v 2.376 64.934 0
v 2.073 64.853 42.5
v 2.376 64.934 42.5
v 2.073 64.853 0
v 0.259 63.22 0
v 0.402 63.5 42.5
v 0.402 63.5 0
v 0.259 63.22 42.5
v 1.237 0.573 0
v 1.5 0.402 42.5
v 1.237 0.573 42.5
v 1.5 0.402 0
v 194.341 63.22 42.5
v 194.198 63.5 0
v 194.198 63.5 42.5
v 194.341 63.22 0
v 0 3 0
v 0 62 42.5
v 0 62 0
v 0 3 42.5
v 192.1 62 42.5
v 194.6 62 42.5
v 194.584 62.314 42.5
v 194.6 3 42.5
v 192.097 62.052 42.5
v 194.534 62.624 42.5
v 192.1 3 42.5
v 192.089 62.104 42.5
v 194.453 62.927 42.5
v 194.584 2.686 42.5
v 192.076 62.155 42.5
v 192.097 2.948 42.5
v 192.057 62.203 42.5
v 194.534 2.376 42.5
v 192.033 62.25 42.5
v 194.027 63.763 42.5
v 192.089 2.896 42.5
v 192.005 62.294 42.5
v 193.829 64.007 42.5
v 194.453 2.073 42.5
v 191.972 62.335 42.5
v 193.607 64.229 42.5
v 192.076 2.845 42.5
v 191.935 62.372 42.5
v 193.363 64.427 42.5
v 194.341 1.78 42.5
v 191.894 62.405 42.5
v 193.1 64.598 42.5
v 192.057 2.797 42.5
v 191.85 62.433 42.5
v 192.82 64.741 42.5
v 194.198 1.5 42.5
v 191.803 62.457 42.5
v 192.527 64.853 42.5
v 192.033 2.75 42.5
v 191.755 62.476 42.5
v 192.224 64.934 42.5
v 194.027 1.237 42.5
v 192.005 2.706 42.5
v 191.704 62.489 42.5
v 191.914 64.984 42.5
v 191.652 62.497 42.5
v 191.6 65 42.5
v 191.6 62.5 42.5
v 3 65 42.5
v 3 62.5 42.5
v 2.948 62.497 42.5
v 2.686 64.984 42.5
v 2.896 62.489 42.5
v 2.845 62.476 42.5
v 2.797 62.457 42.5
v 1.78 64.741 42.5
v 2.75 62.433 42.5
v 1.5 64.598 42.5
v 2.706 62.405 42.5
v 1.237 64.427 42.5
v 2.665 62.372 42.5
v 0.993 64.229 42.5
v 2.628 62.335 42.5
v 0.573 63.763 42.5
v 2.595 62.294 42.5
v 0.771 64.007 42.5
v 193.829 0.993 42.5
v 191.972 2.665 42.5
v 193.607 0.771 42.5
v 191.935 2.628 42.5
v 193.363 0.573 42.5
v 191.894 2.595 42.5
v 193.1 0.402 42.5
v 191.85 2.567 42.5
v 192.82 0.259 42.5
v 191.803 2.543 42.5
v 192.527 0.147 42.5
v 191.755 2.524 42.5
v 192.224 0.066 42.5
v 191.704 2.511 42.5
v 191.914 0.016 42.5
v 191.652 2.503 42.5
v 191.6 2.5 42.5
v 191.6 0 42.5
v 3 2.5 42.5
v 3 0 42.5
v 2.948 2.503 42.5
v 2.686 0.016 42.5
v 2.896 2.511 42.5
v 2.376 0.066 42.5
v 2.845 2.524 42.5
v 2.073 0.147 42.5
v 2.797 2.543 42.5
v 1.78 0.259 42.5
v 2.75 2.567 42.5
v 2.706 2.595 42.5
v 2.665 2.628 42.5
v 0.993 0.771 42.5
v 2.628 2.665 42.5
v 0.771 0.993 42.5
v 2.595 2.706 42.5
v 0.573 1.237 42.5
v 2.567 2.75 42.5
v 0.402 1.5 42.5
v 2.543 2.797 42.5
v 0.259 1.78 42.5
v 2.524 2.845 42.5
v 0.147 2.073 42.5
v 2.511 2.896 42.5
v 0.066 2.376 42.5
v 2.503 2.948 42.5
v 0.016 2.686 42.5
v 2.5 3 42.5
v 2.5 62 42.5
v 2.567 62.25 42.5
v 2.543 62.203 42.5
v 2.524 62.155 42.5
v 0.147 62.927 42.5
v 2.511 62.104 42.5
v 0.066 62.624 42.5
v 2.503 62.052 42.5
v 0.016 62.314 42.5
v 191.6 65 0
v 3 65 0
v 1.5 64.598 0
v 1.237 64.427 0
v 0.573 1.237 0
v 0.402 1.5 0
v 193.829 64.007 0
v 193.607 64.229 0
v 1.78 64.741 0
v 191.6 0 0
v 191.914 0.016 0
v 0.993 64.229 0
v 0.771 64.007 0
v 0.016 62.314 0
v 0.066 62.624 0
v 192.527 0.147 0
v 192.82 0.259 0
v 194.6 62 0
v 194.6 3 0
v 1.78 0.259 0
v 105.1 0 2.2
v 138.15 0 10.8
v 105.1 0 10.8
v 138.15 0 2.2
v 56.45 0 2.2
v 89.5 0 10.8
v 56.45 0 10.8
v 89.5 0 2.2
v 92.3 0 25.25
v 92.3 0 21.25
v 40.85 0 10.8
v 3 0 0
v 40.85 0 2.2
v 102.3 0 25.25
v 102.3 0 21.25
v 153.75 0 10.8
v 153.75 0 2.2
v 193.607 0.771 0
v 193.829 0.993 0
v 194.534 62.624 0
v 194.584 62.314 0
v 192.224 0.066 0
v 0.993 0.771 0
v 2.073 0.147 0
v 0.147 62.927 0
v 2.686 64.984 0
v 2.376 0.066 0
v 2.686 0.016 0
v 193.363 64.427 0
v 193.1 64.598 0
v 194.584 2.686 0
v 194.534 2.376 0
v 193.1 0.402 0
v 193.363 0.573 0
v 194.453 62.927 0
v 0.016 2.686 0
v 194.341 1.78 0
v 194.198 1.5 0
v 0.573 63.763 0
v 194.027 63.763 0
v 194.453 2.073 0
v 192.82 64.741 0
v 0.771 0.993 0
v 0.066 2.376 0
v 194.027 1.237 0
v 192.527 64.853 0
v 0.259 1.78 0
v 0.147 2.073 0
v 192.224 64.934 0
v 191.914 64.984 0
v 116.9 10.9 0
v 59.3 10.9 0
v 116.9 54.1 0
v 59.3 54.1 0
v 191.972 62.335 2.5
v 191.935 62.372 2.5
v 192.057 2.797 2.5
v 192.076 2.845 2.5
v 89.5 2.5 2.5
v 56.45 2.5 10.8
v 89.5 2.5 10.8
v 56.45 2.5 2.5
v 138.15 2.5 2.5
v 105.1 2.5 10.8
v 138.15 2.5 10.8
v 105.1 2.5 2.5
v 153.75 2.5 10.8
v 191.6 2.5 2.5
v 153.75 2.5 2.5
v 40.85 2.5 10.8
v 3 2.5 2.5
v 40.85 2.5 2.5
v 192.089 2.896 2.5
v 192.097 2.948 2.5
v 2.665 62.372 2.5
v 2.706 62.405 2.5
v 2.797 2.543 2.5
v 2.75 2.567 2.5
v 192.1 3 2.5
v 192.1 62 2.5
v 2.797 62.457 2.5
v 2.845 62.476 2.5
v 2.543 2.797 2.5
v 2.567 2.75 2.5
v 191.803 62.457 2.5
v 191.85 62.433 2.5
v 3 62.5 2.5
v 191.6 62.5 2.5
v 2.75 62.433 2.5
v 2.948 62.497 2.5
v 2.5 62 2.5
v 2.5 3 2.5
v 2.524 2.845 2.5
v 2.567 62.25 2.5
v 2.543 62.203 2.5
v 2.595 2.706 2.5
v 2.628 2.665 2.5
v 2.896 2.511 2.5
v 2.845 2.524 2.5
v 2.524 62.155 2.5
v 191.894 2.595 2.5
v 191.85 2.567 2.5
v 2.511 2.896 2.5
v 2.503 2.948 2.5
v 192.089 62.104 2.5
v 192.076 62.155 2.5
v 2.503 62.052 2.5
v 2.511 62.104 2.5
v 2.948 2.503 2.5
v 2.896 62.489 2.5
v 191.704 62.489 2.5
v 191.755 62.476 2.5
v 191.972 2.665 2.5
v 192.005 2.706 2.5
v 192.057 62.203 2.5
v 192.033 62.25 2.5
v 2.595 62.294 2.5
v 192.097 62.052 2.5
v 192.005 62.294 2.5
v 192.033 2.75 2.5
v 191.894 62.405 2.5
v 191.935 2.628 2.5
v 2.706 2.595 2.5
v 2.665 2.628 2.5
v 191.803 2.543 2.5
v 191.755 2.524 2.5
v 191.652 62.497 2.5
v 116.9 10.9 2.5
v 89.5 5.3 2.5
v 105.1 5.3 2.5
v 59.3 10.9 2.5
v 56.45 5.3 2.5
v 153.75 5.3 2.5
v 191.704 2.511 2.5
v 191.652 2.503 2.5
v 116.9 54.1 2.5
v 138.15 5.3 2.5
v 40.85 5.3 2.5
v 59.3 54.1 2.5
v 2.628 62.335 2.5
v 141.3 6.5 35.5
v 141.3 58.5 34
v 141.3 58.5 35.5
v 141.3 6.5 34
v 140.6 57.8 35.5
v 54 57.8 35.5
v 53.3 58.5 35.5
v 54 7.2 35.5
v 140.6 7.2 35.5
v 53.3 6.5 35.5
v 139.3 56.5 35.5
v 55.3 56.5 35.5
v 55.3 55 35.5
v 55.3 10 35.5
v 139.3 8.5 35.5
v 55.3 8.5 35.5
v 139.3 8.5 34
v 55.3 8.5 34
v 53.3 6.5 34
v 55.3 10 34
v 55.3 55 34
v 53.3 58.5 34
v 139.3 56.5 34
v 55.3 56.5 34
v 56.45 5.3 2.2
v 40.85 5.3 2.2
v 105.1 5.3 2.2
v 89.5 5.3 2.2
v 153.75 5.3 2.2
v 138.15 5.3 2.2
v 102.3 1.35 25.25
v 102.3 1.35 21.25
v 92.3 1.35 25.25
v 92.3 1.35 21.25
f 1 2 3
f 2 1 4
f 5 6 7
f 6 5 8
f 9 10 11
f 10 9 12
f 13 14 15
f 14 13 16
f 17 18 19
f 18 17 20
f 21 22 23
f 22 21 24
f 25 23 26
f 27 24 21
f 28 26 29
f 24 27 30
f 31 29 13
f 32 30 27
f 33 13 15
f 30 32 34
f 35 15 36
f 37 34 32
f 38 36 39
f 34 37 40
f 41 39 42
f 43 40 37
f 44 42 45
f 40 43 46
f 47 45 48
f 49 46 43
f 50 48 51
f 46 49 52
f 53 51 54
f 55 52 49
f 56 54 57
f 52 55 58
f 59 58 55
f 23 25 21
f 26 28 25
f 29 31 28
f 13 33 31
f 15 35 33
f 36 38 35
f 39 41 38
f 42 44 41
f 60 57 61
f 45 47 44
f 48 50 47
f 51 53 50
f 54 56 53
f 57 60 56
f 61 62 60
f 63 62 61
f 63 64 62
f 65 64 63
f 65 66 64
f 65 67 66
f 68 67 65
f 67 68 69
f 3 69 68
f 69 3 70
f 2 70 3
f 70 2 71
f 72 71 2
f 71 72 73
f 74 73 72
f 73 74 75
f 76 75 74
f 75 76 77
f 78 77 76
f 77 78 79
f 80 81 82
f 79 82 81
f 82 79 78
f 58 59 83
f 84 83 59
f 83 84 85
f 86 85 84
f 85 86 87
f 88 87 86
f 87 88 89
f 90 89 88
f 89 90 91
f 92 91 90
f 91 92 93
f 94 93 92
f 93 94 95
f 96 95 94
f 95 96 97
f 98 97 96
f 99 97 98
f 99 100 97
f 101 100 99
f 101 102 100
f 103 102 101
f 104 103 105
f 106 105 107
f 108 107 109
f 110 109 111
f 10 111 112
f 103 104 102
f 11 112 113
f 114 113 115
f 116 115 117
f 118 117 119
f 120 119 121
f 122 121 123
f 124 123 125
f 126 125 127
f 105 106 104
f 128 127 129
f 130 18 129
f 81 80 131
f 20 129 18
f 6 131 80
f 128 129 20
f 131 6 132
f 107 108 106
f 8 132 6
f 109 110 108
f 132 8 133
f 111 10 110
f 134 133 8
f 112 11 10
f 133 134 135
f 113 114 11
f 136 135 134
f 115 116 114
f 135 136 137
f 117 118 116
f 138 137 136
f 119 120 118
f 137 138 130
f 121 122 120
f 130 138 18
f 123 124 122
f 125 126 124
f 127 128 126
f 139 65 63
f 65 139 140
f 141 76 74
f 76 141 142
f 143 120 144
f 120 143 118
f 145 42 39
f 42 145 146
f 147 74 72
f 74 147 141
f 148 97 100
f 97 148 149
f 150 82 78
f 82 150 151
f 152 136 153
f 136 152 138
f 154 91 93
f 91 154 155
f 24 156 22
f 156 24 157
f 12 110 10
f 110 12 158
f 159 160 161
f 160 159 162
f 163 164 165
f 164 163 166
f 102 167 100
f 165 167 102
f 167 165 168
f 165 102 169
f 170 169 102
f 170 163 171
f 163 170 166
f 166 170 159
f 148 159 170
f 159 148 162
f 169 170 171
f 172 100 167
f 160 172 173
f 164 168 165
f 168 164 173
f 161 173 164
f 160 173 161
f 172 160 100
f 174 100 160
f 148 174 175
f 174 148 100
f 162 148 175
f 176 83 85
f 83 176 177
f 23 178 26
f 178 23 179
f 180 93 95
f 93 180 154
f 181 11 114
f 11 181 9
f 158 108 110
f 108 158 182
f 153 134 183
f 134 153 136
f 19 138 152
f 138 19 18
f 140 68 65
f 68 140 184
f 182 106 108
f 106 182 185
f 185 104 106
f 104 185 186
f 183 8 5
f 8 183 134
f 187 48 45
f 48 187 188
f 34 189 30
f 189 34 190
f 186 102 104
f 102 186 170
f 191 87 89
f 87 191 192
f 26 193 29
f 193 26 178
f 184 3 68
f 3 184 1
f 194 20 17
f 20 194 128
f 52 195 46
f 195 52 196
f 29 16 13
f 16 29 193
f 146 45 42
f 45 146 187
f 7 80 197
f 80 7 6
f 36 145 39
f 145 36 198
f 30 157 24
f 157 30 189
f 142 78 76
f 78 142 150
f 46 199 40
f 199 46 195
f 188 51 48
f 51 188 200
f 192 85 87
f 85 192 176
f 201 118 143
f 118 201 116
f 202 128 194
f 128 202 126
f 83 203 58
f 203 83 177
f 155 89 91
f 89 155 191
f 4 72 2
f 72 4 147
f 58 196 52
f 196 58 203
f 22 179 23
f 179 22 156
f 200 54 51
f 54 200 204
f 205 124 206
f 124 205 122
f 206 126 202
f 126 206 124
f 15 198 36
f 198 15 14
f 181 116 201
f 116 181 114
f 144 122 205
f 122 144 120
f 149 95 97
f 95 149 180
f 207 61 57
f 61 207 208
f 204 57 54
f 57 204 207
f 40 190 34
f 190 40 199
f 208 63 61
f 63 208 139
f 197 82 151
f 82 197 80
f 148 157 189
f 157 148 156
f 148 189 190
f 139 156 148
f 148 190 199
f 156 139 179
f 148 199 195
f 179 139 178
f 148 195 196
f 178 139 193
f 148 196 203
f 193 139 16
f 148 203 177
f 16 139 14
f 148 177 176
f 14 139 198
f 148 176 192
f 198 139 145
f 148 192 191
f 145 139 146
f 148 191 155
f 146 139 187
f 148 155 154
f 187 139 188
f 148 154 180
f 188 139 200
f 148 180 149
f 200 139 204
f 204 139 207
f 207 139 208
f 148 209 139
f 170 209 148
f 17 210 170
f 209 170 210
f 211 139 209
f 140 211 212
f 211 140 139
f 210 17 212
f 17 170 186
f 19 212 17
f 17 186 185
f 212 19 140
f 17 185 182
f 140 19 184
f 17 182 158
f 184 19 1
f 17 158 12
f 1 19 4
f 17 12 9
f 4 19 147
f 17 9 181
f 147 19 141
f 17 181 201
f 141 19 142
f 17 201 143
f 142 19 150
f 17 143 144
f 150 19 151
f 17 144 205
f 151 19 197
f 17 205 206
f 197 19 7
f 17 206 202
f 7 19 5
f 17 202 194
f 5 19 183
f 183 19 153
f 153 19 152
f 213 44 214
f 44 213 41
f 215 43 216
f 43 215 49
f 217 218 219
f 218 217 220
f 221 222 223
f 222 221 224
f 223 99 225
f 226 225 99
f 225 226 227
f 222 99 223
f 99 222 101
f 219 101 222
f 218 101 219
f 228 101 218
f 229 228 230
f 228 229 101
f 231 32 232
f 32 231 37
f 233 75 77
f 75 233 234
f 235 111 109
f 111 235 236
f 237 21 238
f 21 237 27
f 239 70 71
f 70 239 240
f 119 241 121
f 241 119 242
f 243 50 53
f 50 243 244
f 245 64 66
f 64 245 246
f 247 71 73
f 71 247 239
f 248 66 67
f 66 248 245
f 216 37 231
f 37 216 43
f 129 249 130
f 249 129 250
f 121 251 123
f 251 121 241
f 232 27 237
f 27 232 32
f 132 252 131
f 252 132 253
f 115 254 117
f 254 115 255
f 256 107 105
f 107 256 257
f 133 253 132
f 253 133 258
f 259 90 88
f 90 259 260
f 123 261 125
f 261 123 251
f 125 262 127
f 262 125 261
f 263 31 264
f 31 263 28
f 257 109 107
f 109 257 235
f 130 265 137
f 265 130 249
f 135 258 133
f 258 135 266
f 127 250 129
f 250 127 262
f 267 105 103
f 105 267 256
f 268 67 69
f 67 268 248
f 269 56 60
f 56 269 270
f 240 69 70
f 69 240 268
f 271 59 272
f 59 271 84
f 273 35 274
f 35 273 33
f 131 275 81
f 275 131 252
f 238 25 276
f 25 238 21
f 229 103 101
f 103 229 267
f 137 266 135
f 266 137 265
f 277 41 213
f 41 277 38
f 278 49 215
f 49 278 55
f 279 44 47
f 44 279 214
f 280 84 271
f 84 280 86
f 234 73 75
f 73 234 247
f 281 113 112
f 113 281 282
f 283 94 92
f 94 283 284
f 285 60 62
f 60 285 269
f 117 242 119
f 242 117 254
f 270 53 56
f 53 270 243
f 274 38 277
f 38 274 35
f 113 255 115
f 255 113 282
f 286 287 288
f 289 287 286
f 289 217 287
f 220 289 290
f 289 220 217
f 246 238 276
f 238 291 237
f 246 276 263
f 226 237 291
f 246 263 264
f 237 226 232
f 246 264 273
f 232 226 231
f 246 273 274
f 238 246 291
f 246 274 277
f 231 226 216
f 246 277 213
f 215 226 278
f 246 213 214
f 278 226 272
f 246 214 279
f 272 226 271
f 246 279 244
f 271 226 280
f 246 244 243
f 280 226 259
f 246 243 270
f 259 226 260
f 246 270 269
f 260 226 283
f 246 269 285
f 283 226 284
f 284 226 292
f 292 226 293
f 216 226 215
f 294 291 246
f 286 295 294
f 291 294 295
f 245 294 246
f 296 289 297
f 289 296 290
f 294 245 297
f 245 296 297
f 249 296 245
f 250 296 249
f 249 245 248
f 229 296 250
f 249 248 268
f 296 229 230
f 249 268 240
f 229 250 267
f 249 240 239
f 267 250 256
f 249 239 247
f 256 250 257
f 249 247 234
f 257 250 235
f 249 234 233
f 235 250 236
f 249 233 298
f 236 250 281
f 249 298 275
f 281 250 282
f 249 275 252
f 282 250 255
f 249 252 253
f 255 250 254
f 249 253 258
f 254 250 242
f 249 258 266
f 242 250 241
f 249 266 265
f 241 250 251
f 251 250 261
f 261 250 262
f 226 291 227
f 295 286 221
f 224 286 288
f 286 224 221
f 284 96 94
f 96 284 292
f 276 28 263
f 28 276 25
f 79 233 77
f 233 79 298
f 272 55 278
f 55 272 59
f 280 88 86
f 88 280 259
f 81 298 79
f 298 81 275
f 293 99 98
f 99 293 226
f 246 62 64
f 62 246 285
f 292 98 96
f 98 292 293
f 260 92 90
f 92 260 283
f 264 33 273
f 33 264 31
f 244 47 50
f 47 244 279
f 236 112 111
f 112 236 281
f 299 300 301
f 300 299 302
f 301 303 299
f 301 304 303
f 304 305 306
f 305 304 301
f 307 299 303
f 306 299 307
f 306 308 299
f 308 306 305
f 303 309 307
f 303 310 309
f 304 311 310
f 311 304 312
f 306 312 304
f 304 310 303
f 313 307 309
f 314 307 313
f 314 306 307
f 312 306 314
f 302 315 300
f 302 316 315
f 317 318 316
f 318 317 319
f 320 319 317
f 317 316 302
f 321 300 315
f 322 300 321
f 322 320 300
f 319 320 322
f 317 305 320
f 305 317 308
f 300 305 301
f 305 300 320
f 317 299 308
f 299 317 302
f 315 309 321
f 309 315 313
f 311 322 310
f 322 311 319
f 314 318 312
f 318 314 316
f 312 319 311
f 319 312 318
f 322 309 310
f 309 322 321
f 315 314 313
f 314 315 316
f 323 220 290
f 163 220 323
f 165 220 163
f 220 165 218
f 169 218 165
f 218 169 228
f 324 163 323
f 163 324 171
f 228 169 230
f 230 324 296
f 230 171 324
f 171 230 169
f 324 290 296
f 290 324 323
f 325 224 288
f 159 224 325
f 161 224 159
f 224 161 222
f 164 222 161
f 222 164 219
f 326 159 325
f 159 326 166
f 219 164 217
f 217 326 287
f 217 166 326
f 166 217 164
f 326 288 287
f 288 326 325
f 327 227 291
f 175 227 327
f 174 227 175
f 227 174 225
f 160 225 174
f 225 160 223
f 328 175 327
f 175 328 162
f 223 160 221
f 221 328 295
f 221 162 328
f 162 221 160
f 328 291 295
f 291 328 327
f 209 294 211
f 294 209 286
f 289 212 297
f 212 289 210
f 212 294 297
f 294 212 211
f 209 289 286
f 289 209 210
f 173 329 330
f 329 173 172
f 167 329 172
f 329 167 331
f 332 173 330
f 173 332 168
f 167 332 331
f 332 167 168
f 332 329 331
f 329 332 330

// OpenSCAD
// file: ../parameters.scad
/*
 * Copyright (C) 2026 Peter Buchegger
 *
 * This file is part of OpenDriveHub.
 *
 * OpenDriveHub is free software: you can redistribute it and/or modify
 * it under the terms of the GNU General Public License as published by
 * the Free Software Foundation, either version 3 of the License, or
 * (at your option) any later version.
 *
 * OpenDriveHub is distributed in the hope that it will be useful,
 * but WITHOUT ANY WARRANTY; without even the implied warranty of
 * MERCHANTABILITY or FITNESS FOR A PARTICULAR PURPOSE. See the
 * GNU General Public License for more details.
 *
 * You should have received a copy of the GNU General Public License
 * along with OpenDriveHub. If not, see <https://www.gnu.org/licenses/>.
 *
 * SPDX-License-Identifier: GPL-3.0-or-later
 */

// =============================================================================
// OpenDriveHub Transmitter Enclosure – Central Parameters
// =============================================================================
// All dimensions in millimeters. Change values here to adjust the entire design.
//
// LAYOUT: Three zones arranged horizontally (front to back, Y axis):
//   [Joystick Zone] → [Module Zone] → [Display Zone]
// All zones share the same width (X). Each zone fits on the print bed.

// --- Print Bed Constraints ---------------------------------------------------
print_bed_x = 200;
print_bed_y = 200;

// --- General Construction ----------------------------------------------------
wall_thickness    = 2.5;   // Outer wall thickness
inner_wall        = 1.6;   // Internal divider walls
corner_radius     = 3.0;   // Outer corner rounding
fit_tolerance     = 0.3;   // General 3D-print fit tolerance

// --- Screw & Fastener Dimensions ---------------------------------------------
// M3 Heat-Set Insert (standard M3×5×5 brass insert)
m3_screw_dia      = 3.2;   // M3 clearance hole
m3_screw_head_dia = 5.8;   // M3 socket head cap screw head
m3_screw_head_h   = 3.0;   // M3 head height
m3_insert_dia     = 4.6;   // Heat-set insert outer diameter
m3_insert_depth   = 5.0;   // Heat-set insert depth
m3_insert_hole_dia = 4.8;  // Hole diameter for heat-set insert (slightly larger)

// --- Zone Connection (tongue-and-groove between zones) -----------------------
tongue_width      = 15.0;  // Width of each tongue
tongue_height     = 8.0;   // Height of tongue (Z)
tongue_depth      = 5.0;   // How far the tongue protrudes (Y)
tongue_tolerance  = 0.3;   // Gap for fit
tongue_count      = 3;     // Number of tongues per joint edge

// --- Joystick D400-R4 --------------------------------------------------------
// JH-D400X-R4 3-axis joystick (panel-mount)
joy_body_width    = 49.6;  // Joystick body width (X)
joy_body_length   = 94.5;  // Joystick body length (Y)
joy_body_height   = 35.0;  // Body height below panel
joy_shaft_height  = 40.0;  // Shaft height above panel
joy_panel_cutout  = 28.0;  // Circular panel cutout diameter
joy_mounting_dia  = 36.0;  // Mounting ring outer diameter
joy_mounting_hole_dia = 3.2; // Mounting screw holes
joy_mounting_hole_pcd = 40.0; // Mounting hole pitch circle diameter

// Ergonomic spacing
joy_center_distance   = 125; // Center-to-center distance between joysticks

// --- Module Bay --------------------------------------------------------------
bay_unit_size     = 30.0;  // Single bay unit (30×30mm)
bay_depth         = 25.0;  // Bay depth (how deep the module sits)
bay_wall          = 1.2;   // Wall between adjacent bays
bay_screw_inset   = 4.0;   // Screw hole distance from bay edge (rear mounting)

// Grid configuration
bay_grid_cols     = 5;     // Number of columns (along X)
bay_grid_rows     = 3;     // Number of rows (along Y)

// Computed grid dimensions
bay_grid_width  = bay_grid_cols * bay_unit_size + (bay_grid_cols + 1) * bay_wall;
bay_grid_height = bay_grid_rows * bay_unit_size + (bay_grid_rows + 1) * bay_wall;

// --- Display (ILI9341 2.8" TFT LCD, mounted LANDSCAPE) ----------------------
// In landscape orientation: long edge = X (width), short edge = Y (depth)
display_pcb_width    = 86.0;   // PCB along X (landscape)
display_pcb_depth    = 50.0;   // PCB along Y (landscape)
display_pcb_thick    = 1.6;    // PCB thickness
display_module_thick = 5.0;    // Total module thickness (PCB + components)

display_view_width   = 57.6;   // Visible area along X (landscape)
display_view_depth   = 43.2;   // Visible area along Y (landscape)
display_view_offset_x = 5.0;   // View area offset from PCB left edge
display_view_offset_y = 3.4;   // View area offset from PCB front edge

display_mount_hole_dia = 3.0;  // Mounting hole diameter
display_mount_inset    = 2.5;  // Mounting hole distance from PCB edge

// --- ESP32 DevKitC (38-pin) --------------------------------------------------
esp32_pcb_width   = 28.0;
esp32_pcb_length  = 55.0;
esp32_pcb_thick   = 1.6;
esp32_total_height = 10.0;    // Including components underneath
esp32_usb_width   = 8.0;      // Micro-USB port width
esp32_usb_height  = 3.5;      // Micro-USB port height

// --- TCA9548A I²C Mux Breakout -----------------------------------------------
mux_pcb_width     = 18.0;
mux_pcb_length    = 25.0;
mux_pcb_thick     = 1.6;

// --- Battery (2S LiPo) ------------------------------------------------------
battery_width     = 35.0;     // Typical 2S 1000-1500mAh LiPo
battery_length    = 68.0;
battery_height    = 18.0;
battery_clearance = 2.0;      // Extra space around battery

// --- Ergonomic Grip ----------------------------------------------------------
grip_length       = 80.0;     // Grip length (Z, downward from joystick zone)
grip_width        = 35.0;     // Grip cross-section width
grip_depth        = 30.0;     // Grip cross-section depth
grip_fillet       = 8.0;      // Grip edge rounding

// --- Zone Dimensions ---------------------------------------------------------
// Uniform width for all zones (X axis) – driven by the widest content
zone_width = max(
    joy_center_distance + joy_body_width + 20, // Joystick spacing + margin
    bay_grid_width + 20,                        // Module grid + margin
    display_pcb_width + 20                      // Display PCB + margin
);

// Zone heights (Z axis) – the enclosure shell height
zone_height       = joy_body_height + wall_thickness + 5; // ~42.5mm

// Zone depths (Y axis, front-to-back for each zone)
joy_zone_depth    = joy_body_width + 20;      // ~70mm
module_zone_depth = bay_grid_height + 15;     // ~110mm
display_zone_depth = display_pcb_depth + 15;  // ~65mm

// Total transmitter depth
total_depth = joy_zone_depth + module_zone_depth + display_zone_depth;

// --- Mounting Posts -----------------------------------------------------------
mount_post_dia     = 8.0;     // Outer diameter of mounting post
mount_post_inset_x = 8.0;     // Inset from zone edge (X)
mount_post_inset_y = 8.0;     // Inset from zone edge (Y)

// --- Cable Routing -----------------------------------------------------------
cable_slot_width   = 10.0;    // Width of cable routing slots between zones
cable_slot_height  = 4.0;     // Height of cable routing slots

// --- Colors (for assembly visualization) -------------------------------------
color_joystick     = [0.2, 0.5, 0.8, 0.9];
color_modules      = [0.8, 0.5, 0.2, 0.9];
color_display      = [0.2, 0.8, 0.3, 0.9];
color_electronics  = [0.6, 0.2, 0.6, 0.9];
color_battery      = [0.8, 0.2, 0.2, 0.9];
color_grip         = [0.4, 0.4, 0.4, 0.9];

// --- Debug / Visualization ---------------------------------------------------
$fn = 60;           // Default facet count for curves
explode = 0;        // Explosion distance (0 = assembled, >0 = exploded view)
show_components = true; // Show placeholder components (joysticks, display, etc.)
// main file
/*
 * Copyright (C) 2026 Peter Buchegger
 *
 * This file is part of OpenDriveHub.
 *
 * OpenDriveHub is free software: you can redistribute it and/or modify
 * it under the terms of the GNU General Public License as published by
 * the Free Software Foundation, either version 3 of the License, or
 * (at your option) any later version.
 *
 * OpenDriveHub is distributed in the hope that it will be useful,
 * but WITHOUT ANY WARRANTY; without even the implied warranty of
 * MERCHANTABILITY or FITNESS FOR A PARTICULAR PURPOSE. See the
 * GNU General Public License for more details.
 *
 * You should have received a copy of the GNU General Public License
 * along with OpenDriveHub. If not, see <https://www.gnu.org/licenses/>.
 *
 * SPDX-License-Identifier: GPL-3.0-or-later
 */

// =============================================================================
// OpenDriveHub Transmitter Enclosure – Display Zone
// =============================================================================
// Rear zone (farthest from the user's body). Contains the ILI9341 2.8" LCD
// mounted in landscape orientation with a bezel/viewing window.
//
// Front edge has grooves to receive module zone tongues.

use <../utils.scad>
include <../parameters.scad>

module display_zone() {
    w = zone_width;
    d = display_zone_depth;
    h = zone_height;

    // LCD position (centered on X and Y within this zone)
    lcd_x = (w - display_pcb_width) / 2;
    lcd_y = (d - display_pcb_depth) / 2;

    // LCD sits near the top surface
    lcd_z = h - display_module_thick - 2;

    bezel_overlap = 2.0; // Bezel overlaps the viewing area

    difference() {
        union() {
            // Zone shell
            zone_shell(w, d, h);

            // LCD support ledge (inside, around the LCD)
            ledge_h = 1.5;
            translate([lcd_x - 1, lcd_y - 1, lcd_z - ledge_h])
                difference() {
                    cube([display_pcb_width + 2, display_pcb_depth + 2,
                          ledge_h]);
                    translate([2, 2, -0.1])
                        cube([display_pcb_width - 2, display_pcb_depth - 2,
                              ledge_h + 0.2]);
                }
        }

        // Grooves on front edge (receive module zone tongues)
        t_positions = tongue_positions(w);
        for (tx = t_positions) {
            groove(tx);
        }

        // LCD PCB pocket (slightly larger than PCB for insertion)
        translate([lcd_x - fit_tolerance, lcd_y - fit_tolerance, lcd_z])
            cube([display_pcb_width + 2 * fit_tolerance,
                  display_pcb_depth + 2 * fit_tolerance,
                  display_module_thick + 3]);

        // Display viewing window (through the top wall)
        translate([lcd_x + display_view_offset_x,
                   lcd_y + display_view_offset_y,
                   -0.1])
            cube([display_view_width, display_view_depth, h + 0.2]);

        // LCD mounting screw holes
        hole_positions = [
            [lcd_x + display_mount_inset,
             lcd_y + display_mount_inset],
            [lcd_x + display_pcb_width - display_mount_inset,
             lcd_y + display_mount_inset],
            [lcd_x + display_mount_inset,
             lcd_y + display_pcb_depth - display_mount_inset],
            [lcd_x + display_pcb_width - display_mount_inset,
             lcd_y + display_pcb_depth - display_mount_inset],
        ];
        for (pos = hole_positions) {
            translate([pos[0], pos[1], lcd_z - 5])
                cylinder(d = display_mount_hole_dia, h = 10);
        }

        // Cable slot at front wall
        translate([w / 2, 0, h / 2])
            cable_slot();
    }
}

// LCD placeholder for visualization
module _lcd_placeholder() {
    // PCB
    color([0.1, 0.3, 0.6, 0.8])
        cube([display_pcb_width, display_pcb_depth, display_pcb_thick]);
    // Active display area
    color([0.05, 0.05, 0.05])
        translate([display_view_offset_x, display_view_offset_y,
                   display_pcb_thick])
            cube([display_view_width, display_view_depth, 1.5]);
}

// Preview
display_zone();

if (show_components) {
    w = zone_width;
    d = display_zone_depth;
    lcd_x = (w - display_pcb_width) / 2;
    lcd_y = (d - display_pcb_depth) / 2;
    lcd_z = zone_height - display_module_thick - 2;

    translate([lcd_x, lcd_y, lcd_z])
        %_lcd_placeholder();
}
